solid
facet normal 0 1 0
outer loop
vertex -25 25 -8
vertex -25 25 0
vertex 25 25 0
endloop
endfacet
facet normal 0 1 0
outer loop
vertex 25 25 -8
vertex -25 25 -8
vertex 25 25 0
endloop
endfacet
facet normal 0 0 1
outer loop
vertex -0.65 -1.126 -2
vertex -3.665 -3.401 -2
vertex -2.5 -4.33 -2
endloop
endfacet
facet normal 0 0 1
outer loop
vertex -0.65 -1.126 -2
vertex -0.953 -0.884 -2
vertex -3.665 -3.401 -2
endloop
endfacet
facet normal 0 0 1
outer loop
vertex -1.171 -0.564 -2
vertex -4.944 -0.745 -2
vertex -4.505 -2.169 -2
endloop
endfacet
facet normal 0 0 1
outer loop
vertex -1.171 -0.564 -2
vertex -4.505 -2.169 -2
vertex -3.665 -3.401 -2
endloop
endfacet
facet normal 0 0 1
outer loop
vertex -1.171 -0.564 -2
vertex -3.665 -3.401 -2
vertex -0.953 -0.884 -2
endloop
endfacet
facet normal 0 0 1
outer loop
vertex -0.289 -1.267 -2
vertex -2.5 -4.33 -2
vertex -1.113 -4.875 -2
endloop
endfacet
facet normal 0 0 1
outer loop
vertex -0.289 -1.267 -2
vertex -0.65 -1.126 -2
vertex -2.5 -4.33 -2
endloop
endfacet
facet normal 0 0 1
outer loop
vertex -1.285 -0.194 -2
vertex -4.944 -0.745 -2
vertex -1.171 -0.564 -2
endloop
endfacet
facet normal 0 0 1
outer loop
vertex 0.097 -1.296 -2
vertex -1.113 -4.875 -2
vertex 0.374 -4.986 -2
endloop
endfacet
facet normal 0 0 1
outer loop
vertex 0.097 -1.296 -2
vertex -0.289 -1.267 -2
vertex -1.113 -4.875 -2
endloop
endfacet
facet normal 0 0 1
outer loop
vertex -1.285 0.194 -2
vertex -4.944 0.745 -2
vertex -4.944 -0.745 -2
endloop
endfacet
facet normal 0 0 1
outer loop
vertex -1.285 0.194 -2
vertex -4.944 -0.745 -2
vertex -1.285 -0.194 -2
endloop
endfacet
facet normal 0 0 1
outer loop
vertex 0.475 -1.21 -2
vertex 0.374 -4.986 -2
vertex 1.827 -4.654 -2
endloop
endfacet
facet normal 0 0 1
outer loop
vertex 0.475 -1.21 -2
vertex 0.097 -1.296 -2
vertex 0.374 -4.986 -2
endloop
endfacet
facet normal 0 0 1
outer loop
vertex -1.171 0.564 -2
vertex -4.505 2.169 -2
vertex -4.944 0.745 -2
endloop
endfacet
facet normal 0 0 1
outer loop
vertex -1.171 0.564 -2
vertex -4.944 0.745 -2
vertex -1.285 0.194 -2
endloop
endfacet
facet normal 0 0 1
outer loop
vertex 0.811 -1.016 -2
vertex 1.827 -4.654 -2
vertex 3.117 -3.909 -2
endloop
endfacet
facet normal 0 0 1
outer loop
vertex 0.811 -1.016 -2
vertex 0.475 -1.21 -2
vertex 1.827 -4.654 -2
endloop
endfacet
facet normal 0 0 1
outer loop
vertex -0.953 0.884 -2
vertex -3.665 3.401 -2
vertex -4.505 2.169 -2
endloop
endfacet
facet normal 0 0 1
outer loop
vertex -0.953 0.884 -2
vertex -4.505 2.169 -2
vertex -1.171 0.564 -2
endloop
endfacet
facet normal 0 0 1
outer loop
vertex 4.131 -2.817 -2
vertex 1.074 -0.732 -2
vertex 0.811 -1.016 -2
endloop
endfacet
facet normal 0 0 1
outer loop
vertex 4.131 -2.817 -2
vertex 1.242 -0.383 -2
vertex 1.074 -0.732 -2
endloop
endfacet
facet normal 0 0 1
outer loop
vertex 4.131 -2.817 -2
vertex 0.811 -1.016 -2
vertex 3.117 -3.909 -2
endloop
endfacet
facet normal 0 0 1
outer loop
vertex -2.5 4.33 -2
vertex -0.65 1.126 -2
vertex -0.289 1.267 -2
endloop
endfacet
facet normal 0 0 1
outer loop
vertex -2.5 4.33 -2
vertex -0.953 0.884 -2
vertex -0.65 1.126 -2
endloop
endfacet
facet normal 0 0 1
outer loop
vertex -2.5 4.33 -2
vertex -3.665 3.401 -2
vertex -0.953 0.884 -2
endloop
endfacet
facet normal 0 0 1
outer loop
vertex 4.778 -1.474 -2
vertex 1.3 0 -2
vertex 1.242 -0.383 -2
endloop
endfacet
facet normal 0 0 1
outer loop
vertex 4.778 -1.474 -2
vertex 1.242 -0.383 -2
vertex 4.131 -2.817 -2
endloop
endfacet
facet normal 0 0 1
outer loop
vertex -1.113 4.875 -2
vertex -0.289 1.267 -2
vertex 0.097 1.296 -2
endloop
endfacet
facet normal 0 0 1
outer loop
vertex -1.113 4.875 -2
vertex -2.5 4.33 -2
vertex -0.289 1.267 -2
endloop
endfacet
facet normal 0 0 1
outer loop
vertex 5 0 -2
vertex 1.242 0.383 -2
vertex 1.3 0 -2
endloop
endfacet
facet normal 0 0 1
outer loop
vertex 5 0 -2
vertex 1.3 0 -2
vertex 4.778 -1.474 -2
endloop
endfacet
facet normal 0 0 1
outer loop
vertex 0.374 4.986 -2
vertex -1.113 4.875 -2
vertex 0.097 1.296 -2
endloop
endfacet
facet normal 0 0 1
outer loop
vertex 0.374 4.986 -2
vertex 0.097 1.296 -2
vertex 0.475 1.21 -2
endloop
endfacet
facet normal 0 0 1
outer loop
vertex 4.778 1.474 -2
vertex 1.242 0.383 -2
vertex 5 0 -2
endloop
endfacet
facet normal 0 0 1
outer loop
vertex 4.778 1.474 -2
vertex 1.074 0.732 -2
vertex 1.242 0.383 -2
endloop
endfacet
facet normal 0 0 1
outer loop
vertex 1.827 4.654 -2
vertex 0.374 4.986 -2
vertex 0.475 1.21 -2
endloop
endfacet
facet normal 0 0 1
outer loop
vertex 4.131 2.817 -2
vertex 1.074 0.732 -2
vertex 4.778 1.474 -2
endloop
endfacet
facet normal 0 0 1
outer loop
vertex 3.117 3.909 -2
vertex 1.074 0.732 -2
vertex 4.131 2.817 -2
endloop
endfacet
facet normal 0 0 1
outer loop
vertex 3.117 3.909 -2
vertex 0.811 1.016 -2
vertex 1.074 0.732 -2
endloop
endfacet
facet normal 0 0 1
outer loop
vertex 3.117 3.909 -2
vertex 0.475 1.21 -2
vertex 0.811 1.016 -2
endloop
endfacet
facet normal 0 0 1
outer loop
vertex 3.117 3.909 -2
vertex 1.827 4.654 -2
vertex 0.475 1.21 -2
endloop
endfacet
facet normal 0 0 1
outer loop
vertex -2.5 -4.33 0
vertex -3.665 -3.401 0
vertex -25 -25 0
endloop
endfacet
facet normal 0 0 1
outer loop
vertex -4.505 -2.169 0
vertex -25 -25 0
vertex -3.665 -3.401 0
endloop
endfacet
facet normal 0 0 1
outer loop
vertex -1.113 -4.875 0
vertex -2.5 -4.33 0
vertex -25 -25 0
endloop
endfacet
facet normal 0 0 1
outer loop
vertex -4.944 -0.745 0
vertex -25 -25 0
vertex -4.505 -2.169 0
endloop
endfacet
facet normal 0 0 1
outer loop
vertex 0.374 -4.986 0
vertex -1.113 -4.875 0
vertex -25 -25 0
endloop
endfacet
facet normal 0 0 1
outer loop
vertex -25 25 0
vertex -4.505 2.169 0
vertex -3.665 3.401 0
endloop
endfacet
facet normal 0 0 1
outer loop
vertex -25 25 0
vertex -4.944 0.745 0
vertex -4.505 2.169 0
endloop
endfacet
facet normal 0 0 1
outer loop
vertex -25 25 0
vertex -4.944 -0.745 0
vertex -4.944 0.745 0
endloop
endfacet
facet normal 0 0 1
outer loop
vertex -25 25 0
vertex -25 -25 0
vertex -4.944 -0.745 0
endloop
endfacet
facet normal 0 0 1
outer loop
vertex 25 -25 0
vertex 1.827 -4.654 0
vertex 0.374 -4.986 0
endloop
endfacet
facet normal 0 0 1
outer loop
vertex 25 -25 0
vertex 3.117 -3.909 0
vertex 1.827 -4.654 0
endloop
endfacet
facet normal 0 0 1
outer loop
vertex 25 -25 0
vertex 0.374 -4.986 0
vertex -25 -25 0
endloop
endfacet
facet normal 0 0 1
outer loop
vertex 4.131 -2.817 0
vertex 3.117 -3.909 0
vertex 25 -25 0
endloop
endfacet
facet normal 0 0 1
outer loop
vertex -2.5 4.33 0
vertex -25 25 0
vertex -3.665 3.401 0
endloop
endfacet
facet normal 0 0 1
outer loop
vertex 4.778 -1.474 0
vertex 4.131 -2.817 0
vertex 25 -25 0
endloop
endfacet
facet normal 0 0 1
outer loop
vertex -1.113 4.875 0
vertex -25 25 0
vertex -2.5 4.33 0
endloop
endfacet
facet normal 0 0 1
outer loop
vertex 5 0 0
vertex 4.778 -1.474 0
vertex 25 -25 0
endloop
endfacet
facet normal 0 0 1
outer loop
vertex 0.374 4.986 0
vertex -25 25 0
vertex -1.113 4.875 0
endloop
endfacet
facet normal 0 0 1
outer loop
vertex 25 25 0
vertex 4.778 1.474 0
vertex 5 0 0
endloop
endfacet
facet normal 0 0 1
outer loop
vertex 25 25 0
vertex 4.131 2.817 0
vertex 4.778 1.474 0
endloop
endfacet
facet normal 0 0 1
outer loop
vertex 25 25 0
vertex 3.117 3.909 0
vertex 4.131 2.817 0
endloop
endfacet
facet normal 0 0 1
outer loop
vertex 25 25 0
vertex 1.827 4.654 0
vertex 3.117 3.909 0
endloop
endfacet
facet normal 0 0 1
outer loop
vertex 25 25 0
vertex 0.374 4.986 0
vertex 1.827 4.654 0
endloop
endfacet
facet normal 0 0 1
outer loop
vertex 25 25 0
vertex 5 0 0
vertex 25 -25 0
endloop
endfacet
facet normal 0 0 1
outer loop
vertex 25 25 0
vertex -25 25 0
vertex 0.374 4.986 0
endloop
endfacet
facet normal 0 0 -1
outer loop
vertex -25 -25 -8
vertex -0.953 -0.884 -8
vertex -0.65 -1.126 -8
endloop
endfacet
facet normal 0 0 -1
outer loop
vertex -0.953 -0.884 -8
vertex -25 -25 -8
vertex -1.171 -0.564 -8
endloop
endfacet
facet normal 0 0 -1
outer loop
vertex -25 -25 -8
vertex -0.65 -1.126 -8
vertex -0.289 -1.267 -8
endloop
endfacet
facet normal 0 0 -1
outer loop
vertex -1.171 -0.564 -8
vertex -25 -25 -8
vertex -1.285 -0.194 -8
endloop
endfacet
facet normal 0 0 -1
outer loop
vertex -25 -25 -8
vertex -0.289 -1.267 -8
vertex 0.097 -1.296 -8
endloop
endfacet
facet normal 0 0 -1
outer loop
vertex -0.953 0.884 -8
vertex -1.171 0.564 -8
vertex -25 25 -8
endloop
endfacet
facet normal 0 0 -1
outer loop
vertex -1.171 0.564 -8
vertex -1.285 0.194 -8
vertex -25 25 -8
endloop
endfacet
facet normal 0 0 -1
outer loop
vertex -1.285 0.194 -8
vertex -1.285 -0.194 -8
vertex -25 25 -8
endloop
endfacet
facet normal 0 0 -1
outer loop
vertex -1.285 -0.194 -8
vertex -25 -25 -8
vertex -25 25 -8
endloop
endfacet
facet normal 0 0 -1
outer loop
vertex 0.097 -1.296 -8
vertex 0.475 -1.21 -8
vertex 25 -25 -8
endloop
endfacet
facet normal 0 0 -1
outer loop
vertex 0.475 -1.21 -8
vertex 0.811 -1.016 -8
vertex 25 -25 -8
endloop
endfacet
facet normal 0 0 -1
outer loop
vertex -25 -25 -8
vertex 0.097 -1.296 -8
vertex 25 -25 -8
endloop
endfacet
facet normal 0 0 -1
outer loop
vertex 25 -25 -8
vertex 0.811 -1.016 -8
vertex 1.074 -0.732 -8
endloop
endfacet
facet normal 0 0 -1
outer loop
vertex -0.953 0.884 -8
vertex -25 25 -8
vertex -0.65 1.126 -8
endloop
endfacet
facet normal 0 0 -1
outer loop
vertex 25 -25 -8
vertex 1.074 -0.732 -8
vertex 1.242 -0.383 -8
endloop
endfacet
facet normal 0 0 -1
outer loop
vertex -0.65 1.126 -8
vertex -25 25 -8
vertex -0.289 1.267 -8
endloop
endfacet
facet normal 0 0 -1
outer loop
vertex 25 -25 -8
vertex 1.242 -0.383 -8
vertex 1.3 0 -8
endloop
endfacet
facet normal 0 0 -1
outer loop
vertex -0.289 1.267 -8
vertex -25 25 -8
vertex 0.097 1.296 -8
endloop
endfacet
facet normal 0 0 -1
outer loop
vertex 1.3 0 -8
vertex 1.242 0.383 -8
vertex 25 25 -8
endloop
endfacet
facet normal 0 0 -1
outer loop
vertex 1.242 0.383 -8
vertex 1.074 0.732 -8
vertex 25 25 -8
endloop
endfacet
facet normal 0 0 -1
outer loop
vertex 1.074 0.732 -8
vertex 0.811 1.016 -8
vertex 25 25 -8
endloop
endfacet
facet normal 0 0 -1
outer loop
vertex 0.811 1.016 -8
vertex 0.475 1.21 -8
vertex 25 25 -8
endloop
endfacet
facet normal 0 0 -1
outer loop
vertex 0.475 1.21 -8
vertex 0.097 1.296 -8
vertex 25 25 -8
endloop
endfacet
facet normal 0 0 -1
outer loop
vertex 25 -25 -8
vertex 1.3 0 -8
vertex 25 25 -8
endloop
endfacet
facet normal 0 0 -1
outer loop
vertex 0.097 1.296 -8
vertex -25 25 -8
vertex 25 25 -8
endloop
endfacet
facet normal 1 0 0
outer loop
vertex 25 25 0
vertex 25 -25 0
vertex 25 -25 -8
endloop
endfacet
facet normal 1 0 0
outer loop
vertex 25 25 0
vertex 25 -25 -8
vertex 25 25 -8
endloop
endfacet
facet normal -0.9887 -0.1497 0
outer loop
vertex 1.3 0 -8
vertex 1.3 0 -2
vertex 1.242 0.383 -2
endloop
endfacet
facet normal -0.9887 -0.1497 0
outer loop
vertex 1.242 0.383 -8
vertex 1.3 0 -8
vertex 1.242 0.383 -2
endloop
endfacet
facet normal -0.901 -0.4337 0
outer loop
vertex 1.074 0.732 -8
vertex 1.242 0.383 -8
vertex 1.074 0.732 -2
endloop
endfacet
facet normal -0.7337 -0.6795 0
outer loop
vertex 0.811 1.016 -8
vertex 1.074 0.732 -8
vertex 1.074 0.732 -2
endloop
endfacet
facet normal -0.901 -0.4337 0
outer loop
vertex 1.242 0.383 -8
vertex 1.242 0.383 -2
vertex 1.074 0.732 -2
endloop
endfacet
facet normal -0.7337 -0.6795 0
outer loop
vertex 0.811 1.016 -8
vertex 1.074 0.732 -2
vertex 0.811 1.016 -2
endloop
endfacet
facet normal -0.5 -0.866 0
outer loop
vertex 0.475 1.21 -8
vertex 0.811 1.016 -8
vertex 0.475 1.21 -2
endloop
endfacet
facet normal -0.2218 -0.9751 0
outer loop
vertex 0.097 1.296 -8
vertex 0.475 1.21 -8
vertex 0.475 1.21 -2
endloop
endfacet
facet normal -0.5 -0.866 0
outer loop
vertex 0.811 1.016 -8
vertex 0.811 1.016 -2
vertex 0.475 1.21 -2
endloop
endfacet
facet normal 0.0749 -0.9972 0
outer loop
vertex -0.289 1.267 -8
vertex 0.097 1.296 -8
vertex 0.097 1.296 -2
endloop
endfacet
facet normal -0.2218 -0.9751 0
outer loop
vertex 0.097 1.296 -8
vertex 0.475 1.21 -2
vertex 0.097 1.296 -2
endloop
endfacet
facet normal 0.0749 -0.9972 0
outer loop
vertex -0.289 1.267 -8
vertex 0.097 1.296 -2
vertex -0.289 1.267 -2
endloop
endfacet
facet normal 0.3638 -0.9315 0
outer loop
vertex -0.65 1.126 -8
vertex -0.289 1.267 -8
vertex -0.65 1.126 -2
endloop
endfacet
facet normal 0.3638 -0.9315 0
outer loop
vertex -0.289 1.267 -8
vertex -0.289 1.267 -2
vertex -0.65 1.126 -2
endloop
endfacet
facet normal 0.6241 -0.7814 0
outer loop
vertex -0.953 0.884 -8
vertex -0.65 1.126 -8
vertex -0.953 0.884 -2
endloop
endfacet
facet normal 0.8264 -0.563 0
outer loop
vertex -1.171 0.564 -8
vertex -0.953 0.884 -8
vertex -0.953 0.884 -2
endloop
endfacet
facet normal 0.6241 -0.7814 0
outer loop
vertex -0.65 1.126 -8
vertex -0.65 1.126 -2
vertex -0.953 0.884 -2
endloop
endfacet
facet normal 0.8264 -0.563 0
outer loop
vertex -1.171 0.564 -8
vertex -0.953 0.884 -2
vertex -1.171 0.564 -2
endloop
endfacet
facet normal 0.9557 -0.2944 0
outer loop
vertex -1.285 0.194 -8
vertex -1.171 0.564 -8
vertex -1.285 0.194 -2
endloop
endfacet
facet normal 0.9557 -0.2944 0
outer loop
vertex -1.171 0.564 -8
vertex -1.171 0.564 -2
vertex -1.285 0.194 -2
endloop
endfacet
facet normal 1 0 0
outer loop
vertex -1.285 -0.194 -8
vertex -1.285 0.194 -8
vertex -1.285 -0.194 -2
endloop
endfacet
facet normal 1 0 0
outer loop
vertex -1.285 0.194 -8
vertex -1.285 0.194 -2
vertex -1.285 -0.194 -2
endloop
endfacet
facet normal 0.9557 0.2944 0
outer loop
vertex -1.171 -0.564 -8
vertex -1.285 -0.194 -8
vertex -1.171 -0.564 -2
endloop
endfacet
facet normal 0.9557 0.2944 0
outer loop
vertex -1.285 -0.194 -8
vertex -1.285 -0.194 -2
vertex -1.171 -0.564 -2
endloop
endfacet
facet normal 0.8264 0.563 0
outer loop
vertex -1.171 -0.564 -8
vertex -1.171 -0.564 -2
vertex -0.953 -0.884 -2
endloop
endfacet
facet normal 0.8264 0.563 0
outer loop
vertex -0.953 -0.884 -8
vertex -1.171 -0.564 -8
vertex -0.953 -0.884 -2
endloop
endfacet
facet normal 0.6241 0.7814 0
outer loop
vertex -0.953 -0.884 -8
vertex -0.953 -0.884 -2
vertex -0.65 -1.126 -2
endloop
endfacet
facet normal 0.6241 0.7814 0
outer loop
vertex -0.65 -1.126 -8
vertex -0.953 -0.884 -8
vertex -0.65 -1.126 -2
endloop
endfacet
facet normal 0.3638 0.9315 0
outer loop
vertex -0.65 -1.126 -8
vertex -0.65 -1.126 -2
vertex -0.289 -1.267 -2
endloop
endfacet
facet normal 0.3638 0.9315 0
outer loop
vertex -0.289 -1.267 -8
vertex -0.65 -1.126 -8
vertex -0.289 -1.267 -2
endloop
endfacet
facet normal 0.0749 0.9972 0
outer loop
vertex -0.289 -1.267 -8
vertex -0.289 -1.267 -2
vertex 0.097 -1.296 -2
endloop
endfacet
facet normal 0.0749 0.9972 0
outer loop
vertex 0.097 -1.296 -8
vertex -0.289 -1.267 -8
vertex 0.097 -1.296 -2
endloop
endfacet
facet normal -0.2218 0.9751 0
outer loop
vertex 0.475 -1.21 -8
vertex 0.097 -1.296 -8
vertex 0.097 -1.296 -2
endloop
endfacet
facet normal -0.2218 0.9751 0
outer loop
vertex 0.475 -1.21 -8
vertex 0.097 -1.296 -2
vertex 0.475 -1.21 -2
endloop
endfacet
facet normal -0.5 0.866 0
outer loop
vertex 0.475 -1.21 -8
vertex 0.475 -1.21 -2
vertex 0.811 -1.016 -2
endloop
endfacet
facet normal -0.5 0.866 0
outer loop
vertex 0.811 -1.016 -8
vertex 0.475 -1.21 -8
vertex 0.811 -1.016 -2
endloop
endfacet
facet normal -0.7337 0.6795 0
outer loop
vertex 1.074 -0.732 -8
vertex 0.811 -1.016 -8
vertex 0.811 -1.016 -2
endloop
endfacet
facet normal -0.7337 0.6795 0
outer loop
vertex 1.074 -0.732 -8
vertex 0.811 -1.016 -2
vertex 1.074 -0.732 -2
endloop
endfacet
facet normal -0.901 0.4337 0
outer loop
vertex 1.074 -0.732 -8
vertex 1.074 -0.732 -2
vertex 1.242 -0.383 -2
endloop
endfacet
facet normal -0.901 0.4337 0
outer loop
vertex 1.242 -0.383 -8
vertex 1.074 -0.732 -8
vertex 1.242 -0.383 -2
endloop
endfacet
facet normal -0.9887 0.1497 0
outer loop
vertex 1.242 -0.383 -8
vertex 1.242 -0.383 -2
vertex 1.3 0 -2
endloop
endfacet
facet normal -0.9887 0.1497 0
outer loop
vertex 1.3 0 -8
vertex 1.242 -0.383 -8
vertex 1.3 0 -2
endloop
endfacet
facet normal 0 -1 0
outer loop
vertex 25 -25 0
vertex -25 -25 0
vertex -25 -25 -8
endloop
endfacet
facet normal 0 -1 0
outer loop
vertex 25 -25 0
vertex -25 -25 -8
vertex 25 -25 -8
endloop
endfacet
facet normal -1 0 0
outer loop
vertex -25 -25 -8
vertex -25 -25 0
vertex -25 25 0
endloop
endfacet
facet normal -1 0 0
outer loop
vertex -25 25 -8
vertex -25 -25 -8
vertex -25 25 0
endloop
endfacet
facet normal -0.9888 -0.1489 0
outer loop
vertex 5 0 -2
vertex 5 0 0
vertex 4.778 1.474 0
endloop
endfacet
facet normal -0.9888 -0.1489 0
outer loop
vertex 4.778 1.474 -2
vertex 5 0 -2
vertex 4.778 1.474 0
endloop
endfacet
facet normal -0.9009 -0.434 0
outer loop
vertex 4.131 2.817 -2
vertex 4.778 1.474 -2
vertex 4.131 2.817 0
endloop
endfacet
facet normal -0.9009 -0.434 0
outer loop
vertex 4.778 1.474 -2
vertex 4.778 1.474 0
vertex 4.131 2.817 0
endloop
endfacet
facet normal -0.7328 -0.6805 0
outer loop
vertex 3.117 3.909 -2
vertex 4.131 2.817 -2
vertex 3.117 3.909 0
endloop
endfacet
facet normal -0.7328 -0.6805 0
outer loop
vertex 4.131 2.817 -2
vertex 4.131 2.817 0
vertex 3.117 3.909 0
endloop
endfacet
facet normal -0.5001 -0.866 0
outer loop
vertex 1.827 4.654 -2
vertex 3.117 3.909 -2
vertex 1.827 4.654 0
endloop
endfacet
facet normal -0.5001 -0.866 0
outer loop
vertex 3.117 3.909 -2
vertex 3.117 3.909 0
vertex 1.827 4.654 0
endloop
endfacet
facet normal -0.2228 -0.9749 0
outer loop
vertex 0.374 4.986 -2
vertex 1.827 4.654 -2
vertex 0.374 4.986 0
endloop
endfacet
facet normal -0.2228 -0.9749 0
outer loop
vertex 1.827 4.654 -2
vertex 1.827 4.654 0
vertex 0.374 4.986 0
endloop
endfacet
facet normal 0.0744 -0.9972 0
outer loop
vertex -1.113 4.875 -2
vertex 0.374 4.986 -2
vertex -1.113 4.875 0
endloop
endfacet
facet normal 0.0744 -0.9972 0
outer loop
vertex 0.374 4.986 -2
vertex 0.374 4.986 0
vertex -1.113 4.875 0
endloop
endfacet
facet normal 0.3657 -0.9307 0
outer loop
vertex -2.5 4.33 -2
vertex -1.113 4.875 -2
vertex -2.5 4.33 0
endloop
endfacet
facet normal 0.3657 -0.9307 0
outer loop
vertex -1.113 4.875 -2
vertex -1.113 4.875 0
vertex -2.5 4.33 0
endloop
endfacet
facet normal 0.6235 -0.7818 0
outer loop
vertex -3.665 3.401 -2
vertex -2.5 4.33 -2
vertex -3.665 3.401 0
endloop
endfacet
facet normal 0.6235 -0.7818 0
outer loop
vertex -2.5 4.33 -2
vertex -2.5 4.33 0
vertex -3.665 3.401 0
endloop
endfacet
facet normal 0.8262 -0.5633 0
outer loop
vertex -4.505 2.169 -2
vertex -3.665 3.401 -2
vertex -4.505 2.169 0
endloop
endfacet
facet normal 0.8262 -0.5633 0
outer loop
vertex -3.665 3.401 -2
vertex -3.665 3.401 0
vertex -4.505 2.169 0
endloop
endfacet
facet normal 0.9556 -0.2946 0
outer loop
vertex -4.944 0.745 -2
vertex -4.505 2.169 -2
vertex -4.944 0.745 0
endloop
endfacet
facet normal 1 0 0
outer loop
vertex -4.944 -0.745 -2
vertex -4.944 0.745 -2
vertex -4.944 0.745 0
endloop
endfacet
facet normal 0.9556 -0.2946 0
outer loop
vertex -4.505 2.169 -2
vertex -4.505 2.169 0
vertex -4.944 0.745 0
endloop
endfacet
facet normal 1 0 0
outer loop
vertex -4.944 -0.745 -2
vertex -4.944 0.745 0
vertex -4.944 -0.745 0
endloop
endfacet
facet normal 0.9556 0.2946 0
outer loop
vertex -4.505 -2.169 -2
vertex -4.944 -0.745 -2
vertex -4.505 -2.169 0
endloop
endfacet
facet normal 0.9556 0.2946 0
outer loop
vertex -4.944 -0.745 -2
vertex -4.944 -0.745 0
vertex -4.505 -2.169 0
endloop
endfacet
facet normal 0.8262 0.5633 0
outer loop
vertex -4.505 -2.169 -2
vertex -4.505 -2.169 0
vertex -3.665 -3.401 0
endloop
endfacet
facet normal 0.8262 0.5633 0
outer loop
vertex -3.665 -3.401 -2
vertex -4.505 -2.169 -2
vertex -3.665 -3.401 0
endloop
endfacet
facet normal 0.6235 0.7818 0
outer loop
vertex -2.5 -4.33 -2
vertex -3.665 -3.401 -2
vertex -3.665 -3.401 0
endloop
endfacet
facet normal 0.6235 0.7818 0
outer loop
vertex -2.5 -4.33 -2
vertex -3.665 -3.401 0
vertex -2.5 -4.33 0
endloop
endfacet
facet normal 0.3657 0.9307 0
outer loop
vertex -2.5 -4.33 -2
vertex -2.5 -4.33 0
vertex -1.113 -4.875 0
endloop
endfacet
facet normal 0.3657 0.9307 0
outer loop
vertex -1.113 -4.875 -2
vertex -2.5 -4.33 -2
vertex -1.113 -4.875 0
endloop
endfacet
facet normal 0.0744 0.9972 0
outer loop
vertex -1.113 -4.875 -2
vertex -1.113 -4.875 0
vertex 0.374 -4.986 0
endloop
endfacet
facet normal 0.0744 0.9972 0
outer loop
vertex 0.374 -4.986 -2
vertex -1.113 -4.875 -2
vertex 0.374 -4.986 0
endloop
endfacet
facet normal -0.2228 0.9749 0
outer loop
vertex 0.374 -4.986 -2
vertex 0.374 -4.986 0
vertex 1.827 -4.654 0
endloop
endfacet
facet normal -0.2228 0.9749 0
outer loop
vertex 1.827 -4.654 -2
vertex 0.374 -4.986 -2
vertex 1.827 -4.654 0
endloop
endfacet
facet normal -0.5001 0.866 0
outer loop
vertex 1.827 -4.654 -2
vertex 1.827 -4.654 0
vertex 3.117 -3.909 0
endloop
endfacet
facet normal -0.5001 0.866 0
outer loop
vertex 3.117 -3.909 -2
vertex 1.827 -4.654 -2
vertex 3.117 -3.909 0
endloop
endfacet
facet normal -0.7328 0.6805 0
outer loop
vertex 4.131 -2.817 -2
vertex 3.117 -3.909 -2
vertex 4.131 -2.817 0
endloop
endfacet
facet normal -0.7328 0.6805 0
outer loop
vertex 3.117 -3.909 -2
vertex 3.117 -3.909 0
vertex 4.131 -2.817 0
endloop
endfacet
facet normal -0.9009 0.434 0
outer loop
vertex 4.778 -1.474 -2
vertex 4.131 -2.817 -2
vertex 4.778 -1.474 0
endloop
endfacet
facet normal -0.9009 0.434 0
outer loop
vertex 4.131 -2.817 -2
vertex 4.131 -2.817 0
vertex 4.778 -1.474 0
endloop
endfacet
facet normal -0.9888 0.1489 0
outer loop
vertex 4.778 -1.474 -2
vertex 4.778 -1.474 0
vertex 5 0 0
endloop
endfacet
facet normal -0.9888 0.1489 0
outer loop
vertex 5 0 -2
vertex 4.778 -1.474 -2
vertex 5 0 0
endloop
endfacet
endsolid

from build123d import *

# Parameters (mm, degrees)
F0_W     = 50
F0_H     = 50
F1_DEPTH = 8
F2_R     = 5
F3_DEPTH = 2
F4_R     = 1.3
F5_DEPTH = 6.001


with BuildPart() as f1:
    # F0 (on Top) → F1 (new body)
    with BuildSketch(Plane.XY):
        Rectangle(F0_W, F0_H)
    extrude(amount=-F1_DEPTH)

    # F2 (on face) → F3 (cut)
    with BuildSketch(Plane.XY):
        Circle(F2_R)
    extrude(amount=-F3_DEPTH, mode=Mode.SUBTRACT)

    # F4 (on face) → F5 (cut, through all)
    with BuildSketch(Plane.XY.offset(-2)):
        Circle(F4_R)
    extrude(amount=-F5_DEPTH, mode=Mode.SUBTRACT)


solid = f1.part
